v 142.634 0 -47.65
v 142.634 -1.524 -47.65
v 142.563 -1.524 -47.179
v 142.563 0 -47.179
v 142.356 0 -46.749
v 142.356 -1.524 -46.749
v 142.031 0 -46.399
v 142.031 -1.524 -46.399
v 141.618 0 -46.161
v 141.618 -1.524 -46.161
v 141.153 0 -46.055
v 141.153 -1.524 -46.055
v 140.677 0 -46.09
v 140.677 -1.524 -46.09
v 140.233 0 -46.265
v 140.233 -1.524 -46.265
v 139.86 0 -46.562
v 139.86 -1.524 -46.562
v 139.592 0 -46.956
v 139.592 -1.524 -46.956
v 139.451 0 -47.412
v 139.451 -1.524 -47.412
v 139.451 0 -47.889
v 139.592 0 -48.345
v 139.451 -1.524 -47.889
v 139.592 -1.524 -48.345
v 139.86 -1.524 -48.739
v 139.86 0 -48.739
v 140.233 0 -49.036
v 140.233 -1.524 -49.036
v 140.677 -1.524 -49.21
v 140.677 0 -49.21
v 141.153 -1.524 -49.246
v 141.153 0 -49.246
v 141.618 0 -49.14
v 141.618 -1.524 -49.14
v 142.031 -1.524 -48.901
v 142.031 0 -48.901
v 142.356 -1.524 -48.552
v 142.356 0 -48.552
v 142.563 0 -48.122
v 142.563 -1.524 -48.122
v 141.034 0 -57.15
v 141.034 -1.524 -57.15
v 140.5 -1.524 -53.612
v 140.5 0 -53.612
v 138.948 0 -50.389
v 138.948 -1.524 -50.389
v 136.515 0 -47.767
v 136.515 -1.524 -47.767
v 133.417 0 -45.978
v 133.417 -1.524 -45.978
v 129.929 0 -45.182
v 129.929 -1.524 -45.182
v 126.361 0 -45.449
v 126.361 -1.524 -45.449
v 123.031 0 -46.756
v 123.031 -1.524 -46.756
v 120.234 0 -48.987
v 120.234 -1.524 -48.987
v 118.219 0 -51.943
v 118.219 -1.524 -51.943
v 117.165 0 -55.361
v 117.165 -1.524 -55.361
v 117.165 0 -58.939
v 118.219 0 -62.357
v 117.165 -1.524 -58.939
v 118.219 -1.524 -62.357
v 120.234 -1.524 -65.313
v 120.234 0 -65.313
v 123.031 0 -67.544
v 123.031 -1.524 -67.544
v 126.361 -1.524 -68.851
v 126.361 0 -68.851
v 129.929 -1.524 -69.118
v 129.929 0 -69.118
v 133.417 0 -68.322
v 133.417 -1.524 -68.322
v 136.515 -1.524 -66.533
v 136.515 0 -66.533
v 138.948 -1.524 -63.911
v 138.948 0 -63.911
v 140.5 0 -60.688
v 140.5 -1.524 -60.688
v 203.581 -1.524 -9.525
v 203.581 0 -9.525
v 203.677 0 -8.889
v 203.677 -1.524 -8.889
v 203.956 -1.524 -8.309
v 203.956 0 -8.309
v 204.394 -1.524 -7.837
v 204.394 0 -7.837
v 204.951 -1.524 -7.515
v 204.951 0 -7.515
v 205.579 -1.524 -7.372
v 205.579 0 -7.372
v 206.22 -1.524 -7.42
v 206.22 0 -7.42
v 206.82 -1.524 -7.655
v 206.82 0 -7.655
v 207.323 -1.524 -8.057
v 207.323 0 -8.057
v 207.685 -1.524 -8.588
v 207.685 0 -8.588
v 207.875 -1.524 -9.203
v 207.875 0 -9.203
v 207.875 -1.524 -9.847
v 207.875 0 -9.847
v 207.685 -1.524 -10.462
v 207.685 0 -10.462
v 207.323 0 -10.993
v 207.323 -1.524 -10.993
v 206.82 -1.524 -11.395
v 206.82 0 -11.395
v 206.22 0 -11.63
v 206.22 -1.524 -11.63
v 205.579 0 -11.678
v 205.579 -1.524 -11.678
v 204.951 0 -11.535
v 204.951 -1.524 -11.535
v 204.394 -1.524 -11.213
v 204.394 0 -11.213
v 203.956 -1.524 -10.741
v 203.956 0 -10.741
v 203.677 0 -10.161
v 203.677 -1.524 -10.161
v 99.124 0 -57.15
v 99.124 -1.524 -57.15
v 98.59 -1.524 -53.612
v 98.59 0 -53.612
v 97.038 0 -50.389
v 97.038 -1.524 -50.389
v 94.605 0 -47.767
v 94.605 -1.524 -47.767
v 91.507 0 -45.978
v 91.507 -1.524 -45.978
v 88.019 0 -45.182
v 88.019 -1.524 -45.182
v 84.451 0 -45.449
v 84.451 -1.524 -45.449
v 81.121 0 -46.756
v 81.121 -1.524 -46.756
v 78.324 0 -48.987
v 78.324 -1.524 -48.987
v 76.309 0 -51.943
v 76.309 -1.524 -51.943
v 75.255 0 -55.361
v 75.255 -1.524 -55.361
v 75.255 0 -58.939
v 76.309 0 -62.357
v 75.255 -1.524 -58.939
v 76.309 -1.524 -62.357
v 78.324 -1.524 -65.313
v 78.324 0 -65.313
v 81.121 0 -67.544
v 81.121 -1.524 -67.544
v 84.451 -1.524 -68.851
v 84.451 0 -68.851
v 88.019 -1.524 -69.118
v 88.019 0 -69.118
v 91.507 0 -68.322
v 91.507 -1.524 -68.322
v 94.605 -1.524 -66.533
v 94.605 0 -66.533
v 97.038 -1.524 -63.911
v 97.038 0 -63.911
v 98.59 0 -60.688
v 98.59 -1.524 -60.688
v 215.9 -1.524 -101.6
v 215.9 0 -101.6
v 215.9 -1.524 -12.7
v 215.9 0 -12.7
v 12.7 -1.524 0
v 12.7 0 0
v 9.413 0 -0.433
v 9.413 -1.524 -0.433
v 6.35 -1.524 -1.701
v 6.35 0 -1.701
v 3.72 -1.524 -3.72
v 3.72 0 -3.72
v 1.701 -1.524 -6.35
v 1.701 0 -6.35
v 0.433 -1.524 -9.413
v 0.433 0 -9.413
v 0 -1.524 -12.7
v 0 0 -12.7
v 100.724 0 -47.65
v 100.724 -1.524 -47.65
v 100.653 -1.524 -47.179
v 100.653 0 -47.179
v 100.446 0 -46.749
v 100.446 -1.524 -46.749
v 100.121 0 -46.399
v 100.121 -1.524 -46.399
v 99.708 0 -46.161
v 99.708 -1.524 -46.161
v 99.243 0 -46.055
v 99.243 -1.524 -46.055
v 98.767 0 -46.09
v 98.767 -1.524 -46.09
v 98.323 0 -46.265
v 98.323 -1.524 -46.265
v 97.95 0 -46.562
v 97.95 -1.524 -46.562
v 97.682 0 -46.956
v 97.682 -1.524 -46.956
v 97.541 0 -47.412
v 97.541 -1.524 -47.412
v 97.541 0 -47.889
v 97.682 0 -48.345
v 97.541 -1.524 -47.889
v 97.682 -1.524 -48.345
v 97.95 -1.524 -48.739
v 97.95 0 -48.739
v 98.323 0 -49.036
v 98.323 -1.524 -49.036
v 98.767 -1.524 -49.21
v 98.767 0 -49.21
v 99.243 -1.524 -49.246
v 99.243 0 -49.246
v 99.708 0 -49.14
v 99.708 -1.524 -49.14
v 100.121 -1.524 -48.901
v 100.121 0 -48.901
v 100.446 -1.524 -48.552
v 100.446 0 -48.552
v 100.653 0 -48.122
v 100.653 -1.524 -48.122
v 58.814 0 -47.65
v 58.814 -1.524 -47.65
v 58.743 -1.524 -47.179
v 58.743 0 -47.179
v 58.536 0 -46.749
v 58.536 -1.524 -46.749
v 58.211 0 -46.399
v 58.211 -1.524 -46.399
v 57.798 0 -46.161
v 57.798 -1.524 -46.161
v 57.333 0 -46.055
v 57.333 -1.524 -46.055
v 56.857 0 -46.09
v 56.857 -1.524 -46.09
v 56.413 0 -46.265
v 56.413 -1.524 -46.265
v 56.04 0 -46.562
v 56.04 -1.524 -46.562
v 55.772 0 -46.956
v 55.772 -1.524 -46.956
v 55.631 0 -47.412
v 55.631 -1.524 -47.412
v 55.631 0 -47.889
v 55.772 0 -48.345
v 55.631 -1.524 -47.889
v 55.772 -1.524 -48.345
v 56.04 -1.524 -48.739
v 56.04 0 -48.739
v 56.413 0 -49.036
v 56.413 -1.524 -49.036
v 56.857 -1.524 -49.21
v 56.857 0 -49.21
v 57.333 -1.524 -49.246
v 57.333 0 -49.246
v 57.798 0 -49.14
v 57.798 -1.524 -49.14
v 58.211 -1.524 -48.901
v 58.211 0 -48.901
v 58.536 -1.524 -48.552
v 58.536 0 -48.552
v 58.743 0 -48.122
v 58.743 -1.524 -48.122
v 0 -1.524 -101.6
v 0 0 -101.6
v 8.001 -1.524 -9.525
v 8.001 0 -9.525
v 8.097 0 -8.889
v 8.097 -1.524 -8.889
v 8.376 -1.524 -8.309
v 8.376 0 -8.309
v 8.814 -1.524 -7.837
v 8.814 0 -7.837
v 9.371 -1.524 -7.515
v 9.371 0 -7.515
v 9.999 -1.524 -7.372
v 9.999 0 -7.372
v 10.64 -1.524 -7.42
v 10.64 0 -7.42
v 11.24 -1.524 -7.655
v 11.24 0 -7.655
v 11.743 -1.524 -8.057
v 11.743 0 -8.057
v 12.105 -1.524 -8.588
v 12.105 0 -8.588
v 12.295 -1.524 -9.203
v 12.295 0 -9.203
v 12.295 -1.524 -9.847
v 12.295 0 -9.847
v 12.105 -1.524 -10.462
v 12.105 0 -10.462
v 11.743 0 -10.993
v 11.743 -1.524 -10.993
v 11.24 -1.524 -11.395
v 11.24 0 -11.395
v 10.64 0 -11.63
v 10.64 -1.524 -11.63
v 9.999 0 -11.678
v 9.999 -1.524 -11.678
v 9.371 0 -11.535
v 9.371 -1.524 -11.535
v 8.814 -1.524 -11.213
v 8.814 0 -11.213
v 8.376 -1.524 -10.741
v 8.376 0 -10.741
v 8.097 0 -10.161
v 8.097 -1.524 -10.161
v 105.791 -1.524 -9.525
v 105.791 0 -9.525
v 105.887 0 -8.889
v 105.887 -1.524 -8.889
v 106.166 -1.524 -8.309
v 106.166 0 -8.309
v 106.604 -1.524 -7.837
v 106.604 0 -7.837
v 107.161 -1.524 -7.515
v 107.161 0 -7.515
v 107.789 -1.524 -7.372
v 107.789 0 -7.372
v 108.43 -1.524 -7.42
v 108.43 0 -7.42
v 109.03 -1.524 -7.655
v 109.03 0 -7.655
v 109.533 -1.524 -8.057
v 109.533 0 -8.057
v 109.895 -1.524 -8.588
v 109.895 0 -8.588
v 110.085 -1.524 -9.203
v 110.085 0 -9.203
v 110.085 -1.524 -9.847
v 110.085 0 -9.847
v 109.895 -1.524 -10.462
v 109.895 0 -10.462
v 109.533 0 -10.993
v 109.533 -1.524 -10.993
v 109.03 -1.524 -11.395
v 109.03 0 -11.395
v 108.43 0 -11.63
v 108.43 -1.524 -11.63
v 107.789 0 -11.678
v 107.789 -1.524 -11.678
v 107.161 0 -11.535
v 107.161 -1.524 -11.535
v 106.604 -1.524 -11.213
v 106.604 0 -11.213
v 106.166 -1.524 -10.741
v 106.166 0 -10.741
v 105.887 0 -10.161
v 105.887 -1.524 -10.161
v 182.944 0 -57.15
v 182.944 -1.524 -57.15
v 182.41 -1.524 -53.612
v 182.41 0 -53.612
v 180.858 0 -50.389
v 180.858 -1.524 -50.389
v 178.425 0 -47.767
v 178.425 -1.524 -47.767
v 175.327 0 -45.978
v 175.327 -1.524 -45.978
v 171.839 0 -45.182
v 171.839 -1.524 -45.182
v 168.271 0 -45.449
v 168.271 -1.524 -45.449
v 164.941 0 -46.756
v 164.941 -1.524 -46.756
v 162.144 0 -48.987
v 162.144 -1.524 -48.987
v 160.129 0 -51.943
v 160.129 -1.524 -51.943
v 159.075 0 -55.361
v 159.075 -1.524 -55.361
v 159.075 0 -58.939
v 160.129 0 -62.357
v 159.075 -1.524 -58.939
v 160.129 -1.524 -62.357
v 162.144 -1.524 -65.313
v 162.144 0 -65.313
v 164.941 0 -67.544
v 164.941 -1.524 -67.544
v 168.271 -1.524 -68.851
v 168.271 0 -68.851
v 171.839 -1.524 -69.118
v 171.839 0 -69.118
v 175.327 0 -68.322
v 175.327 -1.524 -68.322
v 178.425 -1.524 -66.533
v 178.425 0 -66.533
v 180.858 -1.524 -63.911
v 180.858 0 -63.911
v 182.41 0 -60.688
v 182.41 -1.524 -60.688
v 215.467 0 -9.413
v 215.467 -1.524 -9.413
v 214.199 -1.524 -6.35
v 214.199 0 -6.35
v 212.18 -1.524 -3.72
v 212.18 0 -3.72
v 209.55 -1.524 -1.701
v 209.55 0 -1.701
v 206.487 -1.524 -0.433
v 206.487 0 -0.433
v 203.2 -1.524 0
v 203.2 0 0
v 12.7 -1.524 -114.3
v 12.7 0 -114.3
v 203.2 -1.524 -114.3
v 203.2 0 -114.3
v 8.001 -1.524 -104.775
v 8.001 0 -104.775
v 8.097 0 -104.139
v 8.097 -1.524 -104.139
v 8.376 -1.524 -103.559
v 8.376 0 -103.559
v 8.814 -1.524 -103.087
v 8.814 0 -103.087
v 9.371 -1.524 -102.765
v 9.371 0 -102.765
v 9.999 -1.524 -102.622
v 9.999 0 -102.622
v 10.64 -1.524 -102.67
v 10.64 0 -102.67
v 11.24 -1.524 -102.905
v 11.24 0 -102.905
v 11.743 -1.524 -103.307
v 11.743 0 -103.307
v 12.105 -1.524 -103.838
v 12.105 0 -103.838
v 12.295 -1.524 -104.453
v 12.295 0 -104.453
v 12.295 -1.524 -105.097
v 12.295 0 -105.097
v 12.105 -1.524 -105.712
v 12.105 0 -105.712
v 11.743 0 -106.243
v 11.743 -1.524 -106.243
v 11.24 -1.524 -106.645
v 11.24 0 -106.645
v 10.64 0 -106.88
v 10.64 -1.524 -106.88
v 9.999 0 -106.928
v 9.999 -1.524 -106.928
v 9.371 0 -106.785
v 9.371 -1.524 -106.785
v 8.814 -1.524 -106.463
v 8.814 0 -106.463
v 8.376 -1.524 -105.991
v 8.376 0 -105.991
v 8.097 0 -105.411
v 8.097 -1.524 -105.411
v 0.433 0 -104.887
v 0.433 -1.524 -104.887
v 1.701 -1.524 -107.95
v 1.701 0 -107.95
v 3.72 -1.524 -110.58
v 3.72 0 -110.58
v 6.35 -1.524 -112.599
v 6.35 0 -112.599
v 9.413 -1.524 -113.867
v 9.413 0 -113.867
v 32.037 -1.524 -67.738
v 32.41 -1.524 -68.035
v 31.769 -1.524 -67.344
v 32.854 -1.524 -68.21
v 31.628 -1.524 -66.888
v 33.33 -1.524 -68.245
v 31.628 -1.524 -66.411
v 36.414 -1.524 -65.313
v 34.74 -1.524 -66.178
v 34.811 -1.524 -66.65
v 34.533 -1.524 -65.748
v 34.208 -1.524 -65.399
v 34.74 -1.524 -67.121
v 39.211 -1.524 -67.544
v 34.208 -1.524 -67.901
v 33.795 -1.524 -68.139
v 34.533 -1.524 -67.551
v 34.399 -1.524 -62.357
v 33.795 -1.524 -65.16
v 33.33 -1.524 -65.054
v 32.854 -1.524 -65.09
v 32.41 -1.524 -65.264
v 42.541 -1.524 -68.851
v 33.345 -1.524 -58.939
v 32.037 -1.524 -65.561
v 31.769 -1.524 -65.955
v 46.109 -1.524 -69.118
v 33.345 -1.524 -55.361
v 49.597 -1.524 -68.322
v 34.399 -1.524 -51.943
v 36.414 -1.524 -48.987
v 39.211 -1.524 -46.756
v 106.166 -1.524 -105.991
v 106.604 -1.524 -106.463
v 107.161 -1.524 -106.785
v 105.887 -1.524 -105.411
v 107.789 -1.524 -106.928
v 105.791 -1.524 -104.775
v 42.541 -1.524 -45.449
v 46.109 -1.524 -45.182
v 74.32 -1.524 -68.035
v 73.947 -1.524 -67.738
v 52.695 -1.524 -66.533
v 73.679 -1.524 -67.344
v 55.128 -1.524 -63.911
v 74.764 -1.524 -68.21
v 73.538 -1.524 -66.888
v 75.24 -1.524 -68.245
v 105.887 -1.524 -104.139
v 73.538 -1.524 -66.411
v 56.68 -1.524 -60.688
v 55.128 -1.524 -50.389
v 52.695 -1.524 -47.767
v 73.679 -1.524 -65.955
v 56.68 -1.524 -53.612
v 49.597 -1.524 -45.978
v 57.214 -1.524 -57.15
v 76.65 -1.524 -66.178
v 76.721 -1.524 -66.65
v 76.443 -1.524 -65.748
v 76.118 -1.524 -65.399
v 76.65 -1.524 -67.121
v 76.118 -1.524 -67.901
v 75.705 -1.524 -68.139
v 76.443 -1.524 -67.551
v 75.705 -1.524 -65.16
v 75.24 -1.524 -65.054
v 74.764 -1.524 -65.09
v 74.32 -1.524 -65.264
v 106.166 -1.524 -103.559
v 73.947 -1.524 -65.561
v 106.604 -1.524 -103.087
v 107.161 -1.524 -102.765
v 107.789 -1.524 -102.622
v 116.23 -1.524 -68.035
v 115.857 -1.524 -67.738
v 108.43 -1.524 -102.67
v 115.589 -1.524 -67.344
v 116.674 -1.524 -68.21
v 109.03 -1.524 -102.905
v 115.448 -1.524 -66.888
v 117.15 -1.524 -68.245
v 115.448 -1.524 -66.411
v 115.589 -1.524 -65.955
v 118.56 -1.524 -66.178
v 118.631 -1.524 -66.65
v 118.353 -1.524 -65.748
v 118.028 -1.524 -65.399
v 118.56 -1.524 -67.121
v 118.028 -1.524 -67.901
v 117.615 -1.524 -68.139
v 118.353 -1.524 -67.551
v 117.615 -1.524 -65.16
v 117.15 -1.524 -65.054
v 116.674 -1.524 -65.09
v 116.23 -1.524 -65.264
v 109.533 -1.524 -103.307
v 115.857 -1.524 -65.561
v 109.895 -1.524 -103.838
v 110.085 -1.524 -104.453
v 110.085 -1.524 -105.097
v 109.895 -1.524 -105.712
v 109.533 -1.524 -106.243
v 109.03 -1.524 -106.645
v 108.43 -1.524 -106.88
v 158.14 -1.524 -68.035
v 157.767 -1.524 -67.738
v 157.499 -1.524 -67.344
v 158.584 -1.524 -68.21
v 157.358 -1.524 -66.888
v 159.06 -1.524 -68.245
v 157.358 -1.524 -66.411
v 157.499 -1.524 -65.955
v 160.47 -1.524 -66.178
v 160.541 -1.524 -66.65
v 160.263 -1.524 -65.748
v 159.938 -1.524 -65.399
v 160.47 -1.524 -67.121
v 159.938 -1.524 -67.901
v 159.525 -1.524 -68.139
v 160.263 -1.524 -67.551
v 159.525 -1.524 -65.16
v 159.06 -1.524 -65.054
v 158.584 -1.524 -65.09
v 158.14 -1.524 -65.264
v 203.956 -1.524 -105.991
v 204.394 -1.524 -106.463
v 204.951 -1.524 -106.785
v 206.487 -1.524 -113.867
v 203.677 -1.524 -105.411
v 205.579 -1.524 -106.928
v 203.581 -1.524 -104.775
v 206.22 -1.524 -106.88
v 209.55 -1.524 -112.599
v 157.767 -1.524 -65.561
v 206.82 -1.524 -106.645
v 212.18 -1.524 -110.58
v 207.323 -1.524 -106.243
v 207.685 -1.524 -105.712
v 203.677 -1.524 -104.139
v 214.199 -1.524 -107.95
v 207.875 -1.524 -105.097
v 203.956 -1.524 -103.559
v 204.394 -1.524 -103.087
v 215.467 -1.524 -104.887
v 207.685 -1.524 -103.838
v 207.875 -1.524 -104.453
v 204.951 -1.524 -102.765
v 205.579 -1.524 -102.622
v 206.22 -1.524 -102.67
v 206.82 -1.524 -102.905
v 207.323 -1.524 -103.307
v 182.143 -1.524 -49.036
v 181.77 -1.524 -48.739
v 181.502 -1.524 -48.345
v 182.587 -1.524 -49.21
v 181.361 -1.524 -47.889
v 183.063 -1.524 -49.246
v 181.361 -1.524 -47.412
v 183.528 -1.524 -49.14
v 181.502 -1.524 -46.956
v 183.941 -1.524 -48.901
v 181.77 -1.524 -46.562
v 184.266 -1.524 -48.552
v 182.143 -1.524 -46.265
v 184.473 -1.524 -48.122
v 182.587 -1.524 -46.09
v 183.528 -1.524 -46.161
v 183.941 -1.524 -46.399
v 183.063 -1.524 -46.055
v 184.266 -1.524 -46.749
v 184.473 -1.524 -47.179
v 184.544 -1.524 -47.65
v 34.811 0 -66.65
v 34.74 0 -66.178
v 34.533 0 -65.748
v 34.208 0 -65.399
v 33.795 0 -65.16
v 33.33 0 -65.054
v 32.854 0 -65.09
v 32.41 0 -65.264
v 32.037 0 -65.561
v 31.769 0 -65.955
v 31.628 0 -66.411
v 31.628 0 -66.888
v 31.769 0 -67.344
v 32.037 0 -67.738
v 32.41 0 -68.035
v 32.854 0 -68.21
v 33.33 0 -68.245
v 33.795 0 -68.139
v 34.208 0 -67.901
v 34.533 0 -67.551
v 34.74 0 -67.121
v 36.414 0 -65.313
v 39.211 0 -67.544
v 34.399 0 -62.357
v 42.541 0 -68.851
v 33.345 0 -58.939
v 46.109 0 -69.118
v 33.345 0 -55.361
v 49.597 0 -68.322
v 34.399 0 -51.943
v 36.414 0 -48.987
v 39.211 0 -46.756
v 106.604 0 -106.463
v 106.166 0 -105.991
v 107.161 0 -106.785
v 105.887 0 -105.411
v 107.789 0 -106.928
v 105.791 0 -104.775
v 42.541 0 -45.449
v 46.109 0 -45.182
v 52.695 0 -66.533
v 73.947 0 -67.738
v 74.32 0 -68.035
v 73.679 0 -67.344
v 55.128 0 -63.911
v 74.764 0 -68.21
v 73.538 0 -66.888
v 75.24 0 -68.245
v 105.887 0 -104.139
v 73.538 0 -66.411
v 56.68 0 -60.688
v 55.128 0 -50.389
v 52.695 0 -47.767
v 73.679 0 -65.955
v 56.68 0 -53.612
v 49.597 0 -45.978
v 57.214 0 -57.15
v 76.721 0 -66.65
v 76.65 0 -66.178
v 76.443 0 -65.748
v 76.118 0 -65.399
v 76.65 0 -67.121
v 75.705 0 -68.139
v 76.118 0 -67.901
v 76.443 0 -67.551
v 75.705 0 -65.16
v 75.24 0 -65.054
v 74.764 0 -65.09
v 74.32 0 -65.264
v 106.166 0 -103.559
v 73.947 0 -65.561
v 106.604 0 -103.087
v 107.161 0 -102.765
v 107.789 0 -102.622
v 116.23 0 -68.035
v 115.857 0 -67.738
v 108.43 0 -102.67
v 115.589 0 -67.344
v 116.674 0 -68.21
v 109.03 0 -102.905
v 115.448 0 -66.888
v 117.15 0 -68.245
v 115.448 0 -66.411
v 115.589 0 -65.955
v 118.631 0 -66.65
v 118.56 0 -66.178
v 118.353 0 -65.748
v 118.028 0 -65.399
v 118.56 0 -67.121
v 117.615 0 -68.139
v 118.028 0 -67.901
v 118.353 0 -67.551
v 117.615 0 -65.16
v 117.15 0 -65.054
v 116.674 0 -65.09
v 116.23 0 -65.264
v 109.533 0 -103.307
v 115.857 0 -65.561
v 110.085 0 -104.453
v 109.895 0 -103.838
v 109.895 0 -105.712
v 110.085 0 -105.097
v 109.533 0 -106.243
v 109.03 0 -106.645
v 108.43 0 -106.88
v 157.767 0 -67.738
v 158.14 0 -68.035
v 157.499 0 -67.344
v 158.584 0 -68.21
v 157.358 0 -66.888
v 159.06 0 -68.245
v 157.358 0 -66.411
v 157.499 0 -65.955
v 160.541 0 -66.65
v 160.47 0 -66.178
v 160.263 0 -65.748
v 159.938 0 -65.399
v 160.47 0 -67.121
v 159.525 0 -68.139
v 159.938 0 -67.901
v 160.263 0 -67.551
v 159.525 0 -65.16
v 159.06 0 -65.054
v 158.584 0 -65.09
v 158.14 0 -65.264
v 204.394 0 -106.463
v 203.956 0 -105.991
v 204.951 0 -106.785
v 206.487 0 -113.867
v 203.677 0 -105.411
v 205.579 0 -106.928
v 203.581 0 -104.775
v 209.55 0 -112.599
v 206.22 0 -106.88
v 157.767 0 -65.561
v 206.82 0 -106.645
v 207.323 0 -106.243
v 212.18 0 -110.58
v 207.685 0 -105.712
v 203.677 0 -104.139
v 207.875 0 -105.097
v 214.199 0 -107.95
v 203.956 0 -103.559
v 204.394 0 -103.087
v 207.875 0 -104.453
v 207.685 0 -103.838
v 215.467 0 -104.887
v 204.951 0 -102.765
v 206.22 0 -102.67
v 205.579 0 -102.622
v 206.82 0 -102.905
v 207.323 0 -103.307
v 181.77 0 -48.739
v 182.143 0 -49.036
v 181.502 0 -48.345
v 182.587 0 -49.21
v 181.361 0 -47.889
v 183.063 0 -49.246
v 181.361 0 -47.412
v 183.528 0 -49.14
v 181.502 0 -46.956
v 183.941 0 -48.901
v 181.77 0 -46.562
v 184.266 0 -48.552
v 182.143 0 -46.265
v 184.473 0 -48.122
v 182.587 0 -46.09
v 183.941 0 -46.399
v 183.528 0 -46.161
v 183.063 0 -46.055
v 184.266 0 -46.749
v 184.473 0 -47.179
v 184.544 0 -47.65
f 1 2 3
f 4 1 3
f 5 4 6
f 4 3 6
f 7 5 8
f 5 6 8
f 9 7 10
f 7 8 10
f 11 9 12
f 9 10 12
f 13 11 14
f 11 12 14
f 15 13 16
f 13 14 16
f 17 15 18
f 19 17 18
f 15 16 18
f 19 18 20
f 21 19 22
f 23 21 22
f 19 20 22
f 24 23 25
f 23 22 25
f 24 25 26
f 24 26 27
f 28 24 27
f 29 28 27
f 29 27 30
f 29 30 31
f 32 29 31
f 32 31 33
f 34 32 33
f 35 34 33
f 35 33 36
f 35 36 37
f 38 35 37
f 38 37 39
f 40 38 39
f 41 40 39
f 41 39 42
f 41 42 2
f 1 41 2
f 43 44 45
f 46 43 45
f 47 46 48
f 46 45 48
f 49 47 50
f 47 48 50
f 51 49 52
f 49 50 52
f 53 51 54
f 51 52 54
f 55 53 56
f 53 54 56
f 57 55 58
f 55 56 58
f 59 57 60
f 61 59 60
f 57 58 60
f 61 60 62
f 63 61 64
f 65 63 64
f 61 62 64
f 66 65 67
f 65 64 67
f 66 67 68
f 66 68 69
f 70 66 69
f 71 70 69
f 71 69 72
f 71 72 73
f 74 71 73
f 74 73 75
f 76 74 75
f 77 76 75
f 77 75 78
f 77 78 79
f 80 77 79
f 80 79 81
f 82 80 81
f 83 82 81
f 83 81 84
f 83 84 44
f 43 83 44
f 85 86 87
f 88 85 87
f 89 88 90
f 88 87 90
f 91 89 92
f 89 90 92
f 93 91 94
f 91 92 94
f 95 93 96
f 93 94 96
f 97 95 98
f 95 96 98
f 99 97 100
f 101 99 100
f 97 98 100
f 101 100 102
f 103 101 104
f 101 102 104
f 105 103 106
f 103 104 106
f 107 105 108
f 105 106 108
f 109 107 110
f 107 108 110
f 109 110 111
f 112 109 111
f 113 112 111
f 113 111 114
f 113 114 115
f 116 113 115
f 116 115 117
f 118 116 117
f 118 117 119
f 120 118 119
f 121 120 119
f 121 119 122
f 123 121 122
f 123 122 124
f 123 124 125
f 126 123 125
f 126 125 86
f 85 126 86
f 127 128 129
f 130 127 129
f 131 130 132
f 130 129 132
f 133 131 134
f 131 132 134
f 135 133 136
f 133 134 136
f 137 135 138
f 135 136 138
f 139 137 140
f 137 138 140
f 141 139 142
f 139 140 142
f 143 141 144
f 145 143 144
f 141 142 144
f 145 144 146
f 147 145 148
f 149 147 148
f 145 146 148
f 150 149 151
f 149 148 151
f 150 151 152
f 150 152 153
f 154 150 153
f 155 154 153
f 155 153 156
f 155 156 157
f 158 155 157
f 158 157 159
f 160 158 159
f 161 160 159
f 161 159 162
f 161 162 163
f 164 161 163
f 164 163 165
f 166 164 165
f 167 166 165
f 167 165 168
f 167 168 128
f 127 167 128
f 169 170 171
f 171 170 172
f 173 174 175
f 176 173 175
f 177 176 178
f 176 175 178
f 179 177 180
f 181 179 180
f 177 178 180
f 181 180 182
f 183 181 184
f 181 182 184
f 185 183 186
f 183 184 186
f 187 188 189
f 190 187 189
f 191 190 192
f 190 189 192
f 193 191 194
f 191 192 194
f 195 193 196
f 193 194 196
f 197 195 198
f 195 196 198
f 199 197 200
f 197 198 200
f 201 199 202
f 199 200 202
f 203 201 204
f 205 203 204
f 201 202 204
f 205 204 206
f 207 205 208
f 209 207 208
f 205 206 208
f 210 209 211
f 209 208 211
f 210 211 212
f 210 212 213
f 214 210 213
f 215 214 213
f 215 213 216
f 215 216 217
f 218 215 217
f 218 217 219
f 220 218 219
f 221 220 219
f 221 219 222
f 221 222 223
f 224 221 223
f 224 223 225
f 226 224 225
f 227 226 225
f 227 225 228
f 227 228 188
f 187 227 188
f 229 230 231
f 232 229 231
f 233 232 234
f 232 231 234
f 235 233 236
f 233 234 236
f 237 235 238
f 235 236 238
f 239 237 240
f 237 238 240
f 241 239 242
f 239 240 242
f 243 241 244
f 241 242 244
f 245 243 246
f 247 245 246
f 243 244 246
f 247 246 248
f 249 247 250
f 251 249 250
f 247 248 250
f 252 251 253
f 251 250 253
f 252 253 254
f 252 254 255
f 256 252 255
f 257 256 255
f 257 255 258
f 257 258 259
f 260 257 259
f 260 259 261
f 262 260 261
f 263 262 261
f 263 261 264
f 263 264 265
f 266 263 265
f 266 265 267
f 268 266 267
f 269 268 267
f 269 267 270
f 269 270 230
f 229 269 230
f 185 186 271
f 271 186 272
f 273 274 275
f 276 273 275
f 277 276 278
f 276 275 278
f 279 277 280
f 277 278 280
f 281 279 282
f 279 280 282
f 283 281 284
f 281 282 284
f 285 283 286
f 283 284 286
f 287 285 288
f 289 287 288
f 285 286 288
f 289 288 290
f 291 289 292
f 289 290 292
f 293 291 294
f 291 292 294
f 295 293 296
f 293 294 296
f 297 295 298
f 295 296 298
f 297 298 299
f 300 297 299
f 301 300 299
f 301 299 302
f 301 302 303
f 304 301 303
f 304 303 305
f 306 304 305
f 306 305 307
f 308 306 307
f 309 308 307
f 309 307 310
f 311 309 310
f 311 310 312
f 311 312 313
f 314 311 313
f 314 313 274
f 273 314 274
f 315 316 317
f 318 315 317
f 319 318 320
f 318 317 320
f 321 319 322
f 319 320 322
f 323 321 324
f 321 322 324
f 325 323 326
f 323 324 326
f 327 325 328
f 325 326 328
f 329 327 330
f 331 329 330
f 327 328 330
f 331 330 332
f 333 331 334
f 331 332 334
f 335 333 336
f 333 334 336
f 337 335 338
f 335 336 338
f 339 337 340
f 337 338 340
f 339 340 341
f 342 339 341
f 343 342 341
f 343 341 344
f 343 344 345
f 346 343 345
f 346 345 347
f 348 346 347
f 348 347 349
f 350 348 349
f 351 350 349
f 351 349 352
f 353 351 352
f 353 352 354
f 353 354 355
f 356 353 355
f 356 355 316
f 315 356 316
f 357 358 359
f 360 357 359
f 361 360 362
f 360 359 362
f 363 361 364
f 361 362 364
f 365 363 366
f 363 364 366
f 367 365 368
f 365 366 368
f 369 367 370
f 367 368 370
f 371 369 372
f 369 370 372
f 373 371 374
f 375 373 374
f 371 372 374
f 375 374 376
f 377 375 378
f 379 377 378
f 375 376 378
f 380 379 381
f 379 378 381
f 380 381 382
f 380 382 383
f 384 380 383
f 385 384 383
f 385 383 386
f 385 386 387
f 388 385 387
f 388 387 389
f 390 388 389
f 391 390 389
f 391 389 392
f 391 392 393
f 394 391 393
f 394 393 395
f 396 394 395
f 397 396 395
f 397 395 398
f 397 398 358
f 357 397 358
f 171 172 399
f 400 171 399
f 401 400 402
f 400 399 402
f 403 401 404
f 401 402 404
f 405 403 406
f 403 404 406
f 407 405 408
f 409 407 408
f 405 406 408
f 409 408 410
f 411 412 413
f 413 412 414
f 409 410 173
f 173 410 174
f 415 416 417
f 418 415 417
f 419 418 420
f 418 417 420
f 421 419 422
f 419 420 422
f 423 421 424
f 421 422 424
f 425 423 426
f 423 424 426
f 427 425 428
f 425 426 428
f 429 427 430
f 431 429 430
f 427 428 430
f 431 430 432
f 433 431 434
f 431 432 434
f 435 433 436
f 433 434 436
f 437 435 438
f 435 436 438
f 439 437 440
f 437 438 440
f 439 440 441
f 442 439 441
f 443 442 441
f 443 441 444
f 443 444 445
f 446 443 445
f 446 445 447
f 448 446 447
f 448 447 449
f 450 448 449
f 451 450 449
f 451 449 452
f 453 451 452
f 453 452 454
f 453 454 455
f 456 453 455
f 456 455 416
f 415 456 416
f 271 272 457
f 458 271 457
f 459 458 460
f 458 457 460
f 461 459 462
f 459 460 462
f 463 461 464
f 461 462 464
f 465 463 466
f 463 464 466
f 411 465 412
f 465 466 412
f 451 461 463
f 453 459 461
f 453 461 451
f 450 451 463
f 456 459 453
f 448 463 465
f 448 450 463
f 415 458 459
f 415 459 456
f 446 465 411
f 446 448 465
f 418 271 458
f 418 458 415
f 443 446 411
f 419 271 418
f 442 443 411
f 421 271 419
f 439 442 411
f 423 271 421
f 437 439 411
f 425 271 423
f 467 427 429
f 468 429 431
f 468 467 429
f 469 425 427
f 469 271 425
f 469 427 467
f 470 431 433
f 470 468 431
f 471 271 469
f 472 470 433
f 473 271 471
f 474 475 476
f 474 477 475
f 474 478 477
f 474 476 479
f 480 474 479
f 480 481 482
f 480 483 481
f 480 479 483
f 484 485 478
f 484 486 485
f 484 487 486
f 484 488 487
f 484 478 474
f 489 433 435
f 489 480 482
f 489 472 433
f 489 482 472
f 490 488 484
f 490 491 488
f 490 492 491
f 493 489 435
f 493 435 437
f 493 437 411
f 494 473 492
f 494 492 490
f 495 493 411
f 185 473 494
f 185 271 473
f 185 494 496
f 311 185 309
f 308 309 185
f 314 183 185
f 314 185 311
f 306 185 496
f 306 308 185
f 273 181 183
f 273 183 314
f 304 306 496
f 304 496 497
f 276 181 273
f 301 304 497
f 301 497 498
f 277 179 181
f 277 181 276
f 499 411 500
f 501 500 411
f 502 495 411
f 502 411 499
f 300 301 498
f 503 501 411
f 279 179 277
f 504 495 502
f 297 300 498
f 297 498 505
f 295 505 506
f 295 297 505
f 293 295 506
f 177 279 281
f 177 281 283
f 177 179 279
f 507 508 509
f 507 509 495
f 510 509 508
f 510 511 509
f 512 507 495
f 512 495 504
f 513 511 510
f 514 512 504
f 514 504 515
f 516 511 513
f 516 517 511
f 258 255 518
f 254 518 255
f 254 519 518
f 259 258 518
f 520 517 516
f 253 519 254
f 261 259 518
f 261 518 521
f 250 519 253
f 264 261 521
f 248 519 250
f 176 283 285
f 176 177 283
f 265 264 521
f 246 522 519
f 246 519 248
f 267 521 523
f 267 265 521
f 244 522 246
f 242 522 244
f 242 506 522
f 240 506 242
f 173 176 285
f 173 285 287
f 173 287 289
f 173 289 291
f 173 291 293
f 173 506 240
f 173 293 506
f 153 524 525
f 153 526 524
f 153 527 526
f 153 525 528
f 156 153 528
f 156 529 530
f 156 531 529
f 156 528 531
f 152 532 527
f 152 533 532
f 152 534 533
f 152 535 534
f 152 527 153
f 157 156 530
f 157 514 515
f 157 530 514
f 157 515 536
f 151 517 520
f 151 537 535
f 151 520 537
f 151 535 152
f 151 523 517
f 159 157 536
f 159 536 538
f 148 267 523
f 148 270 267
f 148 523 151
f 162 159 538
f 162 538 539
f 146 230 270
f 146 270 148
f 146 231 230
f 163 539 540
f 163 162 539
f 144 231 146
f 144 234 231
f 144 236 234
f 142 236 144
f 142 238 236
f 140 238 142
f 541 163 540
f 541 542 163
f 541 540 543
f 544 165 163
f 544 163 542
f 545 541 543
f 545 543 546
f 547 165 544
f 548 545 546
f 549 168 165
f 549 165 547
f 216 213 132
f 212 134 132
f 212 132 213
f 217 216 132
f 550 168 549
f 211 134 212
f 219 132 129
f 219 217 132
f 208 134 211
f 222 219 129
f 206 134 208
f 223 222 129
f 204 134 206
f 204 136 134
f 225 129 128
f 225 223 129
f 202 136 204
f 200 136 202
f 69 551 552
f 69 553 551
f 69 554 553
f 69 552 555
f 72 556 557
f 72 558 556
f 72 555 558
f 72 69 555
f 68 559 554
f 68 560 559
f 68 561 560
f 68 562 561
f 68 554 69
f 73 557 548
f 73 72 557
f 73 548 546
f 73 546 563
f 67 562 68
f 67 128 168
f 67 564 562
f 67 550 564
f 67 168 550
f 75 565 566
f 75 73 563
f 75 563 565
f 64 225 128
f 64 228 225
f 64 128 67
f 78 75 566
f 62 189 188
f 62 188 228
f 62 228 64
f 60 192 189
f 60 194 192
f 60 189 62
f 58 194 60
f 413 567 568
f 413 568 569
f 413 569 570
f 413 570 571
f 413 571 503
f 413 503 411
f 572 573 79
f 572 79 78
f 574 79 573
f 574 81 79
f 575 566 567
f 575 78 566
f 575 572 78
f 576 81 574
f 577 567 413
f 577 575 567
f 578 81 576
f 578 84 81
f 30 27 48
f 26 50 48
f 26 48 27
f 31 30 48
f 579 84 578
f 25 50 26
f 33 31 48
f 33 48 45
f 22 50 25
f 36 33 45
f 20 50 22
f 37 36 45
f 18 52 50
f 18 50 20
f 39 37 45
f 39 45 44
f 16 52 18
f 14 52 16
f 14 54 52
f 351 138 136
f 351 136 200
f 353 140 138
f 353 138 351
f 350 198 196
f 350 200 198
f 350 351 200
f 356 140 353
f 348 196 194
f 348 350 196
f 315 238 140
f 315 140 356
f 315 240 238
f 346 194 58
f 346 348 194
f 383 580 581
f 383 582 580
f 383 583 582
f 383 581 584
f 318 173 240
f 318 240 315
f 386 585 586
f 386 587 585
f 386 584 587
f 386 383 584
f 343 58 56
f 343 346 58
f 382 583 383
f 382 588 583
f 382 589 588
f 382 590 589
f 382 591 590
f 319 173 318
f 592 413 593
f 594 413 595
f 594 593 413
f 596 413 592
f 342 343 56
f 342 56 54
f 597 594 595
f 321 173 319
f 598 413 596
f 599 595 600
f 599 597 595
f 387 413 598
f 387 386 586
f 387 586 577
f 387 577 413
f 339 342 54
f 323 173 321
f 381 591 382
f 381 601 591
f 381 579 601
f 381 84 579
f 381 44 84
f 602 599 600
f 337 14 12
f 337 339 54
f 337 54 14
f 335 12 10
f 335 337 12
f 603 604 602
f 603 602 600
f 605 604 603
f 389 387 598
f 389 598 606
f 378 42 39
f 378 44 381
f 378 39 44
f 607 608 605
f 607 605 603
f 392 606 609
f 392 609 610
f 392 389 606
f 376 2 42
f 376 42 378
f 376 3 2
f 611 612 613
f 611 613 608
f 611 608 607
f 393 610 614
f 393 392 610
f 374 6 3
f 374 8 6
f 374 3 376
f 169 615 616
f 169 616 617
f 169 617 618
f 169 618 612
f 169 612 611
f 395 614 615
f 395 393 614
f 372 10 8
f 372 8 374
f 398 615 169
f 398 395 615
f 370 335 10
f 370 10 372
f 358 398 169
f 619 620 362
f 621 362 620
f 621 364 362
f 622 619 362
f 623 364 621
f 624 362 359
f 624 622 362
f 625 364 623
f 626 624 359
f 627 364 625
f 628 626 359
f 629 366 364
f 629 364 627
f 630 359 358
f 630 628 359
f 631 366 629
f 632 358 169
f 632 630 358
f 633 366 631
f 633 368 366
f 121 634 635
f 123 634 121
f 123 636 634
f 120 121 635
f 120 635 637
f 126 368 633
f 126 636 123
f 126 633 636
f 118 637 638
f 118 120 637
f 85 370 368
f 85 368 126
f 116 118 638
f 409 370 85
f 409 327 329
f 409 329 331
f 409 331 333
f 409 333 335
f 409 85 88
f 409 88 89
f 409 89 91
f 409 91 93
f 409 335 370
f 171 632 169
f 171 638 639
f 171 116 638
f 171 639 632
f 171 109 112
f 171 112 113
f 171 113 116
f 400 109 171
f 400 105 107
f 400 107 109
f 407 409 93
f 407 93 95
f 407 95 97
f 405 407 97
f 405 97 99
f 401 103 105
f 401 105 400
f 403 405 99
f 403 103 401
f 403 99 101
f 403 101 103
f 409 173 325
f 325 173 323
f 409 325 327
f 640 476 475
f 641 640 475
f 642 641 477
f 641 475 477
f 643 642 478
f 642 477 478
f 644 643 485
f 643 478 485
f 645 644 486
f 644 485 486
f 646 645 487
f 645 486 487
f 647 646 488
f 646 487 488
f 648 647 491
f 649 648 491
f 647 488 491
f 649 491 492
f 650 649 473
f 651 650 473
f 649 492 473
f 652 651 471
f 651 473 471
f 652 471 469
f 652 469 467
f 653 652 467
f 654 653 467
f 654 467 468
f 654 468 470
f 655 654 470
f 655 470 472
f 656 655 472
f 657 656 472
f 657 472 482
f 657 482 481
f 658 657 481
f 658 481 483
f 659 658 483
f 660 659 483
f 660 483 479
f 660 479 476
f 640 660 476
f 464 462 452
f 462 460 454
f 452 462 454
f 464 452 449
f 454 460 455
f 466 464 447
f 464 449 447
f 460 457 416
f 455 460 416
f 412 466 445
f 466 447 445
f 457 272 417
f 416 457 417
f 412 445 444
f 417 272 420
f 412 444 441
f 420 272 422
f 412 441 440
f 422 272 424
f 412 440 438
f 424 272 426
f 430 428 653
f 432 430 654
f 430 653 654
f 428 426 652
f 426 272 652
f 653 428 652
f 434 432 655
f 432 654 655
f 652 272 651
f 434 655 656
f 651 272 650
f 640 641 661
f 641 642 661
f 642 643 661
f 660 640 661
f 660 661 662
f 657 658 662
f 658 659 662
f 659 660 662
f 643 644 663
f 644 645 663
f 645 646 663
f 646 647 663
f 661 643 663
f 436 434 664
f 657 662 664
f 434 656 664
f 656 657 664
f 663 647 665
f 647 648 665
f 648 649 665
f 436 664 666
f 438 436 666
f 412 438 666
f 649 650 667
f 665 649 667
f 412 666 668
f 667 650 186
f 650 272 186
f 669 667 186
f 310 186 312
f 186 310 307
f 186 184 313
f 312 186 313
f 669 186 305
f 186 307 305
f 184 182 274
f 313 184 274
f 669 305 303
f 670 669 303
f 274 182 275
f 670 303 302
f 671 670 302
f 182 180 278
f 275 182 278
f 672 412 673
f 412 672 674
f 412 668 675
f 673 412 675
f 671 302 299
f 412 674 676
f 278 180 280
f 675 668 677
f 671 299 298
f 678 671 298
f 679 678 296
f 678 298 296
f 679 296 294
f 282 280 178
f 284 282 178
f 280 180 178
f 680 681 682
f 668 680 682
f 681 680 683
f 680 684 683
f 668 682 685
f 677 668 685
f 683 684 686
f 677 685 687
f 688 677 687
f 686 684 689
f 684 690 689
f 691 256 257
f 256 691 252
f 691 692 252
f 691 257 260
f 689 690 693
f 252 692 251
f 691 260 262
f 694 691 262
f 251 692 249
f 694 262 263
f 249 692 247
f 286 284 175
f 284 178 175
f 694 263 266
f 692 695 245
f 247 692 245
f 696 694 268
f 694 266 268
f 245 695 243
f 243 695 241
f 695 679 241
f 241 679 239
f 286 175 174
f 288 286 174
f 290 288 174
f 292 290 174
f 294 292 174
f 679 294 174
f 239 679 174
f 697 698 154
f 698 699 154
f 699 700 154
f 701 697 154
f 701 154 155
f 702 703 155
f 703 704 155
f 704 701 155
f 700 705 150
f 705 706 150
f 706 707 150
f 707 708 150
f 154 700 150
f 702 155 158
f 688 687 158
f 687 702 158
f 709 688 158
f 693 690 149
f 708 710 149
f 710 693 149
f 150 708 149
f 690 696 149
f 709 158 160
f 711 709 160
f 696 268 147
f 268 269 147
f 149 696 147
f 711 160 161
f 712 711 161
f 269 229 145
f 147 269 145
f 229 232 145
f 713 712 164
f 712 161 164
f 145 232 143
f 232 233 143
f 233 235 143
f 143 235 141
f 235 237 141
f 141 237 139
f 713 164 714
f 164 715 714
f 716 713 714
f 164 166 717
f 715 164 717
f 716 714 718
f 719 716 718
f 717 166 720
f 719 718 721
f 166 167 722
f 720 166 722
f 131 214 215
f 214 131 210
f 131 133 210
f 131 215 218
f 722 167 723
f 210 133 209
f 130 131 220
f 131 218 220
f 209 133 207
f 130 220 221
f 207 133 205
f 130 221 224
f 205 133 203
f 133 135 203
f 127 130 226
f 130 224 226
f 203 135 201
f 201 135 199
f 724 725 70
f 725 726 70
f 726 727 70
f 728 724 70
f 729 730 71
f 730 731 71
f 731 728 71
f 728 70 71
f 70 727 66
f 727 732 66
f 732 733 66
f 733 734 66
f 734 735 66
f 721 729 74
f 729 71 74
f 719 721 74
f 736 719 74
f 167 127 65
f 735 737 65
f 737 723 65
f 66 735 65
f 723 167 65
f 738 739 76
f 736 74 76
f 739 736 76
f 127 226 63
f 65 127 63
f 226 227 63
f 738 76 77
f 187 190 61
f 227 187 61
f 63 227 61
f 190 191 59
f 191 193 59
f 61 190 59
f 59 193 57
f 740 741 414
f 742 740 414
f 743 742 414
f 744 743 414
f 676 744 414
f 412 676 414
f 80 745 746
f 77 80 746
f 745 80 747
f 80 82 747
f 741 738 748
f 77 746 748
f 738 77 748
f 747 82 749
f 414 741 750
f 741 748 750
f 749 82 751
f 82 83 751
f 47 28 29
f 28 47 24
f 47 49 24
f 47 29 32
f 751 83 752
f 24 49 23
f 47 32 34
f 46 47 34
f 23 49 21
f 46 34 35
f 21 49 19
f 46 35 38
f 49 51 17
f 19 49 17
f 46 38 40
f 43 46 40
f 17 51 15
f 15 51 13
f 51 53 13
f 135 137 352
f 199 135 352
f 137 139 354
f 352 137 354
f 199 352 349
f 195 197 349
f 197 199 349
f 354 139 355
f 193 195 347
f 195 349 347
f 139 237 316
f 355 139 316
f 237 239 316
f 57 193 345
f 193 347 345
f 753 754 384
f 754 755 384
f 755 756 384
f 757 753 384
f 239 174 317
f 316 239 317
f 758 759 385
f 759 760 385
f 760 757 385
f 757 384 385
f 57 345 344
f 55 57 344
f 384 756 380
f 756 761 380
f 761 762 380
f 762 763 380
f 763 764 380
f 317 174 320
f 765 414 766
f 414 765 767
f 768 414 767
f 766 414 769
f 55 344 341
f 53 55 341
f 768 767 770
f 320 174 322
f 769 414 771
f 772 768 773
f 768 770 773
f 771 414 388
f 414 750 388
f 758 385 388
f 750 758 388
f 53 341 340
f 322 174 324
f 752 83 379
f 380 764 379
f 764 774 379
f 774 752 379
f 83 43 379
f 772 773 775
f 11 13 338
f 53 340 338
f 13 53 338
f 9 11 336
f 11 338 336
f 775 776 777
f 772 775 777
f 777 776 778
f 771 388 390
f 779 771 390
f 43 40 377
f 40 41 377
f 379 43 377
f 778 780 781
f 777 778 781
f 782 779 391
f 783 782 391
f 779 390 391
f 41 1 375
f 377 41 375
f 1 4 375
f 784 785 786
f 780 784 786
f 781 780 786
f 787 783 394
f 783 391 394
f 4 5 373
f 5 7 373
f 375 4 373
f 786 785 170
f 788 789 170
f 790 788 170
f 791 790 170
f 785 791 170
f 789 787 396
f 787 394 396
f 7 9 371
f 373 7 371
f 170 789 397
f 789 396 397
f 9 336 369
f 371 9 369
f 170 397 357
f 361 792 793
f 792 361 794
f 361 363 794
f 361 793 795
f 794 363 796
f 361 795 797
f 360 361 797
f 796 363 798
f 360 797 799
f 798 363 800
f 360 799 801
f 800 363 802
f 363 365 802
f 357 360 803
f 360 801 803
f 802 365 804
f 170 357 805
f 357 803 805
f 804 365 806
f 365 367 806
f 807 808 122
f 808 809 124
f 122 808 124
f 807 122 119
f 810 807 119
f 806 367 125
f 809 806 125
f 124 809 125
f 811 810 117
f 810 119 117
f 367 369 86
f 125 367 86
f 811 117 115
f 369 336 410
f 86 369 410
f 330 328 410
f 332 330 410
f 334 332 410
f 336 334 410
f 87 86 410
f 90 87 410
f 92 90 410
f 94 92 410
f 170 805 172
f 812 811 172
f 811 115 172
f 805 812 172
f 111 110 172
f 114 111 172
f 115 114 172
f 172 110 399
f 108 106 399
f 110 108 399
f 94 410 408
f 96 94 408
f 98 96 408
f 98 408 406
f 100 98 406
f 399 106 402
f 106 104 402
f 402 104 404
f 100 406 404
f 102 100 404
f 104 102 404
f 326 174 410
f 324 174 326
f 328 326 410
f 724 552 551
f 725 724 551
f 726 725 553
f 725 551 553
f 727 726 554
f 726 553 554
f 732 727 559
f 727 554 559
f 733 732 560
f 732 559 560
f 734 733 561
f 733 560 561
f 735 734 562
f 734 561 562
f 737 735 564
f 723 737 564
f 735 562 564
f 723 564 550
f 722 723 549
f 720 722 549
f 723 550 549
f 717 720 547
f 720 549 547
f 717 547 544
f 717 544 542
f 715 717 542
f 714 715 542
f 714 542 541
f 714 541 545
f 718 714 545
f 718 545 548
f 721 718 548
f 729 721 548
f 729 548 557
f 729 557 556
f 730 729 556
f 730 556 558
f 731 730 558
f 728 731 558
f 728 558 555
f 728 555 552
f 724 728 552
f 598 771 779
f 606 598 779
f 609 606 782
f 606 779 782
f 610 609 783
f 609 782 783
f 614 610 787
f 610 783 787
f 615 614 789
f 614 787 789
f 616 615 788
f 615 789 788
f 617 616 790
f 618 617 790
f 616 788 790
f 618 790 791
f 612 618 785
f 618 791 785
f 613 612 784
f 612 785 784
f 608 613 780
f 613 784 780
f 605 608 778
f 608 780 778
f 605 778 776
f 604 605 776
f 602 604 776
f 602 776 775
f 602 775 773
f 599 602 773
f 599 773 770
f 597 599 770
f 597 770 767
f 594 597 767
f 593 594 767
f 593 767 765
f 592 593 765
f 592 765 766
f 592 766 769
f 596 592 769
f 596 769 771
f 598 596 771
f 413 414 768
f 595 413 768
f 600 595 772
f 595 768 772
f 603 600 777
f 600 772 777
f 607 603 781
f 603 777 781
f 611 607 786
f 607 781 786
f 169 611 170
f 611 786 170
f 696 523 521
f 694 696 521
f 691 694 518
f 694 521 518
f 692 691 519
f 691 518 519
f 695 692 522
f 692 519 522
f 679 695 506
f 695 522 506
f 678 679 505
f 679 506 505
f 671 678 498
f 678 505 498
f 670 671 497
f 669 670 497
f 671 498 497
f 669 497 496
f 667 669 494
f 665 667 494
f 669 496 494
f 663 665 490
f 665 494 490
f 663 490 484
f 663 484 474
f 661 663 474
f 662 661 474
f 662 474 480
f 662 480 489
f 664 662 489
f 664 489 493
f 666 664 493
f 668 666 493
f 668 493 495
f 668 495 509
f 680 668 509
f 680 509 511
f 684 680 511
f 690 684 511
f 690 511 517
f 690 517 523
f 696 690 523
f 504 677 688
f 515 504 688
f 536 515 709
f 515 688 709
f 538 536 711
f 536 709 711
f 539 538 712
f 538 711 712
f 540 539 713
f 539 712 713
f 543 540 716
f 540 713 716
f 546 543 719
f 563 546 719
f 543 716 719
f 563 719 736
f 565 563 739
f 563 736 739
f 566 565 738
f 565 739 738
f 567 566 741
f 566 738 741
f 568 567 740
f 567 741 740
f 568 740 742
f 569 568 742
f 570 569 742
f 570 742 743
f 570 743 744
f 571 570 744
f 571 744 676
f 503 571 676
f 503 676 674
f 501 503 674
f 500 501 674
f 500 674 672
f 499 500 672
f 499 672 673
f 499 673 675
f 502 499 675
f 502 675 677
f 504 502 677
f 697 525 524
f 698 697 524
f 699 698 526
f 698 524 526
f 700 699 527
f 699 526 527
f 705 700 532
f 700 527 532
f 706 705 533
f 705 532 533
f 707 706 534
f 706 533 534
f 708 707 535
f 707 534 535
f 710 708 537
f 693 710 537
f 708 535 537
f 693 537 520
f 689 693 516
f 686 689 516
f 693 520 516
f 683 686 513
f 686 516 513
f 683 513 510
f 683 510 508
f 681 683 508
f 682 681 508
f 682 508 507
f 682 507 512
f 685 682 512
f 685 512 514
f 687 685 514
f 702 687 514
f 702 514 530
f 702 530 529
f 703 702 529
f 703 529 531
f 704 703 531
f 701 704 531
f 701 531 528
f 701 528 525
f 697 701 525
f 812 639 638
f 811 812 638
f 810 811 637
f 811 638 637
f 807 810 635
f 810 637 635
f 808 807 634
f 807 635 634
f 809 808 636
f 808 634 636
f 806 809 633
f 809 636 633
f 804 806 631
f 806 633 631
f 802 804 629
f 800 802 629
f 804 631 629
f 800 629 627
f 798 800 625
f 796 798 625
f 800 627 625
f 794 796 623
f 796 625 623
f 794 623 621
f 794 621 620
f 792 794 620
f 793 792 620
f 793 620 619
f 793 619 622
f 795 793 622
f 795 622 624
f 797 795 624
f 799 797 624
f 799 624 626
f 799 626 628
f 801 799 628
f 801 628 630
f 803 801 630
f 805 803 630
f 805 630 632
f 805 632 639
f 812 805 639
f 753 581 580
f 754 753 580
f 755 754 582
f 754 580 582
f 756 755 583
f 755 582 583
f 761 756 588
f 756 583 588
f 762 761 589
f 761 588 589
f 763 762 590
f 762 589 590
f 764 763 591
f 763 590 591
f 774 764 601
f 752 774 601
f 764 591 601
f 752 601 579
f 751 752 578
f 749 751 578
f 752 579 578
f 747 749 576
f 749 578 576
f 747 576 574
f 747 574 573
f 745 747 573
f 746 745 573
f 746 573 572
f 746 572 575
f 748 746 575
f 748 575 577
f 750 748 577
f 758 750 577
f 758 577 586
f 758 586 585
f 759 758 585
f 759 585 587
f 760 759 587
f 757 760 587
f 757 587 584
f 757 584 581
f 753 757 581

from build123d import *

# Parameters (mm, degrees)
F1_DEPTH = 1.524
F2_R     = 12.0015
F2_R_2   = 1.6002
F3_DEPTH = 1.525
F5_D     = 4.318


with BuildPart() as f1:
    # F0 (on Front) → F1 (new body)
    with BuildSketch(Plane.XZ):
        with BuildLine():
            Line((203.2, 0), (12.7, 0))
            ThreePointArc((12.7, 0), (3.7197438789, -3.7197438789), (0, -12.7))
            Line((0, -12.7), (0, -101.6))
            ThreePointArc((0, -101.6), (3.7197438789, -110.5802561211), (12.7, -114.3))
            Line((12.7, -114.3), (203.2, -114.3))
            ThreePointArc((203.2, -114.3), (212.1802561211, -110.5802561211), (215.9, -101.6))
            Line((215.9, -101.6), (215.9, -12.7))
            ThreePointArc((215.9, -12.7), (212.1802561211, -3.7197438789), (203.2, 0))
        make_face()
    extrude(amount=F1_DEPTH)

    # F2 (on face) → F3 (cut, through all)
    with BuildSketch(Plane.XZ.offset(1.524)):
        with Locations((45.212, -57.15)):
            Circle(F2_R)
        with Locations((33.2105027356, -66.6496)):
            Circle(F2_R_2)
        with Locations((57.2135027356, -47.6504)):
            Circle(F2_R_2)
        with Locations((99.1235027356, -47.6504)):
            Circle(F2_R_2)
        with Locations((87.122, -57.15)):
            Circle(F2_R)
        with Locations((75.1205027356, -66.6496)):
            Circle(F2_R_2)
        with Locations((141.0335027356, -47.6504)):
            Circle(F2_R_2)
        with Locations((129.032, -57.15)):
            Circle(F2_R)
        with Locations((117.0305027356, -66.6496)):
            Circle(F2_R_2)
        with Locations((182.9435027356, -47.6504)):
            Circle(F2_R_2)
        with Locations((170.942, -57.15)):
            Circle(F2_R)
        with Locations((158.9405027356, -66.6496)):
            Circle(F2_R_2)
    extrude(amount=-F3_DEPTH, mode=Mode.SUBTRACT)

    # F5 (through all)
    with Locations(Plane.XZ.offset(1.524)):
        with Locations((10.16, -9.525), (107.95, -9.525), (205.74, -9.525), (205.74, -104.775), (107.95, -104.775), (10.16, -104.775)):
            Hole(F5_D / 2)


solid = f1.part
